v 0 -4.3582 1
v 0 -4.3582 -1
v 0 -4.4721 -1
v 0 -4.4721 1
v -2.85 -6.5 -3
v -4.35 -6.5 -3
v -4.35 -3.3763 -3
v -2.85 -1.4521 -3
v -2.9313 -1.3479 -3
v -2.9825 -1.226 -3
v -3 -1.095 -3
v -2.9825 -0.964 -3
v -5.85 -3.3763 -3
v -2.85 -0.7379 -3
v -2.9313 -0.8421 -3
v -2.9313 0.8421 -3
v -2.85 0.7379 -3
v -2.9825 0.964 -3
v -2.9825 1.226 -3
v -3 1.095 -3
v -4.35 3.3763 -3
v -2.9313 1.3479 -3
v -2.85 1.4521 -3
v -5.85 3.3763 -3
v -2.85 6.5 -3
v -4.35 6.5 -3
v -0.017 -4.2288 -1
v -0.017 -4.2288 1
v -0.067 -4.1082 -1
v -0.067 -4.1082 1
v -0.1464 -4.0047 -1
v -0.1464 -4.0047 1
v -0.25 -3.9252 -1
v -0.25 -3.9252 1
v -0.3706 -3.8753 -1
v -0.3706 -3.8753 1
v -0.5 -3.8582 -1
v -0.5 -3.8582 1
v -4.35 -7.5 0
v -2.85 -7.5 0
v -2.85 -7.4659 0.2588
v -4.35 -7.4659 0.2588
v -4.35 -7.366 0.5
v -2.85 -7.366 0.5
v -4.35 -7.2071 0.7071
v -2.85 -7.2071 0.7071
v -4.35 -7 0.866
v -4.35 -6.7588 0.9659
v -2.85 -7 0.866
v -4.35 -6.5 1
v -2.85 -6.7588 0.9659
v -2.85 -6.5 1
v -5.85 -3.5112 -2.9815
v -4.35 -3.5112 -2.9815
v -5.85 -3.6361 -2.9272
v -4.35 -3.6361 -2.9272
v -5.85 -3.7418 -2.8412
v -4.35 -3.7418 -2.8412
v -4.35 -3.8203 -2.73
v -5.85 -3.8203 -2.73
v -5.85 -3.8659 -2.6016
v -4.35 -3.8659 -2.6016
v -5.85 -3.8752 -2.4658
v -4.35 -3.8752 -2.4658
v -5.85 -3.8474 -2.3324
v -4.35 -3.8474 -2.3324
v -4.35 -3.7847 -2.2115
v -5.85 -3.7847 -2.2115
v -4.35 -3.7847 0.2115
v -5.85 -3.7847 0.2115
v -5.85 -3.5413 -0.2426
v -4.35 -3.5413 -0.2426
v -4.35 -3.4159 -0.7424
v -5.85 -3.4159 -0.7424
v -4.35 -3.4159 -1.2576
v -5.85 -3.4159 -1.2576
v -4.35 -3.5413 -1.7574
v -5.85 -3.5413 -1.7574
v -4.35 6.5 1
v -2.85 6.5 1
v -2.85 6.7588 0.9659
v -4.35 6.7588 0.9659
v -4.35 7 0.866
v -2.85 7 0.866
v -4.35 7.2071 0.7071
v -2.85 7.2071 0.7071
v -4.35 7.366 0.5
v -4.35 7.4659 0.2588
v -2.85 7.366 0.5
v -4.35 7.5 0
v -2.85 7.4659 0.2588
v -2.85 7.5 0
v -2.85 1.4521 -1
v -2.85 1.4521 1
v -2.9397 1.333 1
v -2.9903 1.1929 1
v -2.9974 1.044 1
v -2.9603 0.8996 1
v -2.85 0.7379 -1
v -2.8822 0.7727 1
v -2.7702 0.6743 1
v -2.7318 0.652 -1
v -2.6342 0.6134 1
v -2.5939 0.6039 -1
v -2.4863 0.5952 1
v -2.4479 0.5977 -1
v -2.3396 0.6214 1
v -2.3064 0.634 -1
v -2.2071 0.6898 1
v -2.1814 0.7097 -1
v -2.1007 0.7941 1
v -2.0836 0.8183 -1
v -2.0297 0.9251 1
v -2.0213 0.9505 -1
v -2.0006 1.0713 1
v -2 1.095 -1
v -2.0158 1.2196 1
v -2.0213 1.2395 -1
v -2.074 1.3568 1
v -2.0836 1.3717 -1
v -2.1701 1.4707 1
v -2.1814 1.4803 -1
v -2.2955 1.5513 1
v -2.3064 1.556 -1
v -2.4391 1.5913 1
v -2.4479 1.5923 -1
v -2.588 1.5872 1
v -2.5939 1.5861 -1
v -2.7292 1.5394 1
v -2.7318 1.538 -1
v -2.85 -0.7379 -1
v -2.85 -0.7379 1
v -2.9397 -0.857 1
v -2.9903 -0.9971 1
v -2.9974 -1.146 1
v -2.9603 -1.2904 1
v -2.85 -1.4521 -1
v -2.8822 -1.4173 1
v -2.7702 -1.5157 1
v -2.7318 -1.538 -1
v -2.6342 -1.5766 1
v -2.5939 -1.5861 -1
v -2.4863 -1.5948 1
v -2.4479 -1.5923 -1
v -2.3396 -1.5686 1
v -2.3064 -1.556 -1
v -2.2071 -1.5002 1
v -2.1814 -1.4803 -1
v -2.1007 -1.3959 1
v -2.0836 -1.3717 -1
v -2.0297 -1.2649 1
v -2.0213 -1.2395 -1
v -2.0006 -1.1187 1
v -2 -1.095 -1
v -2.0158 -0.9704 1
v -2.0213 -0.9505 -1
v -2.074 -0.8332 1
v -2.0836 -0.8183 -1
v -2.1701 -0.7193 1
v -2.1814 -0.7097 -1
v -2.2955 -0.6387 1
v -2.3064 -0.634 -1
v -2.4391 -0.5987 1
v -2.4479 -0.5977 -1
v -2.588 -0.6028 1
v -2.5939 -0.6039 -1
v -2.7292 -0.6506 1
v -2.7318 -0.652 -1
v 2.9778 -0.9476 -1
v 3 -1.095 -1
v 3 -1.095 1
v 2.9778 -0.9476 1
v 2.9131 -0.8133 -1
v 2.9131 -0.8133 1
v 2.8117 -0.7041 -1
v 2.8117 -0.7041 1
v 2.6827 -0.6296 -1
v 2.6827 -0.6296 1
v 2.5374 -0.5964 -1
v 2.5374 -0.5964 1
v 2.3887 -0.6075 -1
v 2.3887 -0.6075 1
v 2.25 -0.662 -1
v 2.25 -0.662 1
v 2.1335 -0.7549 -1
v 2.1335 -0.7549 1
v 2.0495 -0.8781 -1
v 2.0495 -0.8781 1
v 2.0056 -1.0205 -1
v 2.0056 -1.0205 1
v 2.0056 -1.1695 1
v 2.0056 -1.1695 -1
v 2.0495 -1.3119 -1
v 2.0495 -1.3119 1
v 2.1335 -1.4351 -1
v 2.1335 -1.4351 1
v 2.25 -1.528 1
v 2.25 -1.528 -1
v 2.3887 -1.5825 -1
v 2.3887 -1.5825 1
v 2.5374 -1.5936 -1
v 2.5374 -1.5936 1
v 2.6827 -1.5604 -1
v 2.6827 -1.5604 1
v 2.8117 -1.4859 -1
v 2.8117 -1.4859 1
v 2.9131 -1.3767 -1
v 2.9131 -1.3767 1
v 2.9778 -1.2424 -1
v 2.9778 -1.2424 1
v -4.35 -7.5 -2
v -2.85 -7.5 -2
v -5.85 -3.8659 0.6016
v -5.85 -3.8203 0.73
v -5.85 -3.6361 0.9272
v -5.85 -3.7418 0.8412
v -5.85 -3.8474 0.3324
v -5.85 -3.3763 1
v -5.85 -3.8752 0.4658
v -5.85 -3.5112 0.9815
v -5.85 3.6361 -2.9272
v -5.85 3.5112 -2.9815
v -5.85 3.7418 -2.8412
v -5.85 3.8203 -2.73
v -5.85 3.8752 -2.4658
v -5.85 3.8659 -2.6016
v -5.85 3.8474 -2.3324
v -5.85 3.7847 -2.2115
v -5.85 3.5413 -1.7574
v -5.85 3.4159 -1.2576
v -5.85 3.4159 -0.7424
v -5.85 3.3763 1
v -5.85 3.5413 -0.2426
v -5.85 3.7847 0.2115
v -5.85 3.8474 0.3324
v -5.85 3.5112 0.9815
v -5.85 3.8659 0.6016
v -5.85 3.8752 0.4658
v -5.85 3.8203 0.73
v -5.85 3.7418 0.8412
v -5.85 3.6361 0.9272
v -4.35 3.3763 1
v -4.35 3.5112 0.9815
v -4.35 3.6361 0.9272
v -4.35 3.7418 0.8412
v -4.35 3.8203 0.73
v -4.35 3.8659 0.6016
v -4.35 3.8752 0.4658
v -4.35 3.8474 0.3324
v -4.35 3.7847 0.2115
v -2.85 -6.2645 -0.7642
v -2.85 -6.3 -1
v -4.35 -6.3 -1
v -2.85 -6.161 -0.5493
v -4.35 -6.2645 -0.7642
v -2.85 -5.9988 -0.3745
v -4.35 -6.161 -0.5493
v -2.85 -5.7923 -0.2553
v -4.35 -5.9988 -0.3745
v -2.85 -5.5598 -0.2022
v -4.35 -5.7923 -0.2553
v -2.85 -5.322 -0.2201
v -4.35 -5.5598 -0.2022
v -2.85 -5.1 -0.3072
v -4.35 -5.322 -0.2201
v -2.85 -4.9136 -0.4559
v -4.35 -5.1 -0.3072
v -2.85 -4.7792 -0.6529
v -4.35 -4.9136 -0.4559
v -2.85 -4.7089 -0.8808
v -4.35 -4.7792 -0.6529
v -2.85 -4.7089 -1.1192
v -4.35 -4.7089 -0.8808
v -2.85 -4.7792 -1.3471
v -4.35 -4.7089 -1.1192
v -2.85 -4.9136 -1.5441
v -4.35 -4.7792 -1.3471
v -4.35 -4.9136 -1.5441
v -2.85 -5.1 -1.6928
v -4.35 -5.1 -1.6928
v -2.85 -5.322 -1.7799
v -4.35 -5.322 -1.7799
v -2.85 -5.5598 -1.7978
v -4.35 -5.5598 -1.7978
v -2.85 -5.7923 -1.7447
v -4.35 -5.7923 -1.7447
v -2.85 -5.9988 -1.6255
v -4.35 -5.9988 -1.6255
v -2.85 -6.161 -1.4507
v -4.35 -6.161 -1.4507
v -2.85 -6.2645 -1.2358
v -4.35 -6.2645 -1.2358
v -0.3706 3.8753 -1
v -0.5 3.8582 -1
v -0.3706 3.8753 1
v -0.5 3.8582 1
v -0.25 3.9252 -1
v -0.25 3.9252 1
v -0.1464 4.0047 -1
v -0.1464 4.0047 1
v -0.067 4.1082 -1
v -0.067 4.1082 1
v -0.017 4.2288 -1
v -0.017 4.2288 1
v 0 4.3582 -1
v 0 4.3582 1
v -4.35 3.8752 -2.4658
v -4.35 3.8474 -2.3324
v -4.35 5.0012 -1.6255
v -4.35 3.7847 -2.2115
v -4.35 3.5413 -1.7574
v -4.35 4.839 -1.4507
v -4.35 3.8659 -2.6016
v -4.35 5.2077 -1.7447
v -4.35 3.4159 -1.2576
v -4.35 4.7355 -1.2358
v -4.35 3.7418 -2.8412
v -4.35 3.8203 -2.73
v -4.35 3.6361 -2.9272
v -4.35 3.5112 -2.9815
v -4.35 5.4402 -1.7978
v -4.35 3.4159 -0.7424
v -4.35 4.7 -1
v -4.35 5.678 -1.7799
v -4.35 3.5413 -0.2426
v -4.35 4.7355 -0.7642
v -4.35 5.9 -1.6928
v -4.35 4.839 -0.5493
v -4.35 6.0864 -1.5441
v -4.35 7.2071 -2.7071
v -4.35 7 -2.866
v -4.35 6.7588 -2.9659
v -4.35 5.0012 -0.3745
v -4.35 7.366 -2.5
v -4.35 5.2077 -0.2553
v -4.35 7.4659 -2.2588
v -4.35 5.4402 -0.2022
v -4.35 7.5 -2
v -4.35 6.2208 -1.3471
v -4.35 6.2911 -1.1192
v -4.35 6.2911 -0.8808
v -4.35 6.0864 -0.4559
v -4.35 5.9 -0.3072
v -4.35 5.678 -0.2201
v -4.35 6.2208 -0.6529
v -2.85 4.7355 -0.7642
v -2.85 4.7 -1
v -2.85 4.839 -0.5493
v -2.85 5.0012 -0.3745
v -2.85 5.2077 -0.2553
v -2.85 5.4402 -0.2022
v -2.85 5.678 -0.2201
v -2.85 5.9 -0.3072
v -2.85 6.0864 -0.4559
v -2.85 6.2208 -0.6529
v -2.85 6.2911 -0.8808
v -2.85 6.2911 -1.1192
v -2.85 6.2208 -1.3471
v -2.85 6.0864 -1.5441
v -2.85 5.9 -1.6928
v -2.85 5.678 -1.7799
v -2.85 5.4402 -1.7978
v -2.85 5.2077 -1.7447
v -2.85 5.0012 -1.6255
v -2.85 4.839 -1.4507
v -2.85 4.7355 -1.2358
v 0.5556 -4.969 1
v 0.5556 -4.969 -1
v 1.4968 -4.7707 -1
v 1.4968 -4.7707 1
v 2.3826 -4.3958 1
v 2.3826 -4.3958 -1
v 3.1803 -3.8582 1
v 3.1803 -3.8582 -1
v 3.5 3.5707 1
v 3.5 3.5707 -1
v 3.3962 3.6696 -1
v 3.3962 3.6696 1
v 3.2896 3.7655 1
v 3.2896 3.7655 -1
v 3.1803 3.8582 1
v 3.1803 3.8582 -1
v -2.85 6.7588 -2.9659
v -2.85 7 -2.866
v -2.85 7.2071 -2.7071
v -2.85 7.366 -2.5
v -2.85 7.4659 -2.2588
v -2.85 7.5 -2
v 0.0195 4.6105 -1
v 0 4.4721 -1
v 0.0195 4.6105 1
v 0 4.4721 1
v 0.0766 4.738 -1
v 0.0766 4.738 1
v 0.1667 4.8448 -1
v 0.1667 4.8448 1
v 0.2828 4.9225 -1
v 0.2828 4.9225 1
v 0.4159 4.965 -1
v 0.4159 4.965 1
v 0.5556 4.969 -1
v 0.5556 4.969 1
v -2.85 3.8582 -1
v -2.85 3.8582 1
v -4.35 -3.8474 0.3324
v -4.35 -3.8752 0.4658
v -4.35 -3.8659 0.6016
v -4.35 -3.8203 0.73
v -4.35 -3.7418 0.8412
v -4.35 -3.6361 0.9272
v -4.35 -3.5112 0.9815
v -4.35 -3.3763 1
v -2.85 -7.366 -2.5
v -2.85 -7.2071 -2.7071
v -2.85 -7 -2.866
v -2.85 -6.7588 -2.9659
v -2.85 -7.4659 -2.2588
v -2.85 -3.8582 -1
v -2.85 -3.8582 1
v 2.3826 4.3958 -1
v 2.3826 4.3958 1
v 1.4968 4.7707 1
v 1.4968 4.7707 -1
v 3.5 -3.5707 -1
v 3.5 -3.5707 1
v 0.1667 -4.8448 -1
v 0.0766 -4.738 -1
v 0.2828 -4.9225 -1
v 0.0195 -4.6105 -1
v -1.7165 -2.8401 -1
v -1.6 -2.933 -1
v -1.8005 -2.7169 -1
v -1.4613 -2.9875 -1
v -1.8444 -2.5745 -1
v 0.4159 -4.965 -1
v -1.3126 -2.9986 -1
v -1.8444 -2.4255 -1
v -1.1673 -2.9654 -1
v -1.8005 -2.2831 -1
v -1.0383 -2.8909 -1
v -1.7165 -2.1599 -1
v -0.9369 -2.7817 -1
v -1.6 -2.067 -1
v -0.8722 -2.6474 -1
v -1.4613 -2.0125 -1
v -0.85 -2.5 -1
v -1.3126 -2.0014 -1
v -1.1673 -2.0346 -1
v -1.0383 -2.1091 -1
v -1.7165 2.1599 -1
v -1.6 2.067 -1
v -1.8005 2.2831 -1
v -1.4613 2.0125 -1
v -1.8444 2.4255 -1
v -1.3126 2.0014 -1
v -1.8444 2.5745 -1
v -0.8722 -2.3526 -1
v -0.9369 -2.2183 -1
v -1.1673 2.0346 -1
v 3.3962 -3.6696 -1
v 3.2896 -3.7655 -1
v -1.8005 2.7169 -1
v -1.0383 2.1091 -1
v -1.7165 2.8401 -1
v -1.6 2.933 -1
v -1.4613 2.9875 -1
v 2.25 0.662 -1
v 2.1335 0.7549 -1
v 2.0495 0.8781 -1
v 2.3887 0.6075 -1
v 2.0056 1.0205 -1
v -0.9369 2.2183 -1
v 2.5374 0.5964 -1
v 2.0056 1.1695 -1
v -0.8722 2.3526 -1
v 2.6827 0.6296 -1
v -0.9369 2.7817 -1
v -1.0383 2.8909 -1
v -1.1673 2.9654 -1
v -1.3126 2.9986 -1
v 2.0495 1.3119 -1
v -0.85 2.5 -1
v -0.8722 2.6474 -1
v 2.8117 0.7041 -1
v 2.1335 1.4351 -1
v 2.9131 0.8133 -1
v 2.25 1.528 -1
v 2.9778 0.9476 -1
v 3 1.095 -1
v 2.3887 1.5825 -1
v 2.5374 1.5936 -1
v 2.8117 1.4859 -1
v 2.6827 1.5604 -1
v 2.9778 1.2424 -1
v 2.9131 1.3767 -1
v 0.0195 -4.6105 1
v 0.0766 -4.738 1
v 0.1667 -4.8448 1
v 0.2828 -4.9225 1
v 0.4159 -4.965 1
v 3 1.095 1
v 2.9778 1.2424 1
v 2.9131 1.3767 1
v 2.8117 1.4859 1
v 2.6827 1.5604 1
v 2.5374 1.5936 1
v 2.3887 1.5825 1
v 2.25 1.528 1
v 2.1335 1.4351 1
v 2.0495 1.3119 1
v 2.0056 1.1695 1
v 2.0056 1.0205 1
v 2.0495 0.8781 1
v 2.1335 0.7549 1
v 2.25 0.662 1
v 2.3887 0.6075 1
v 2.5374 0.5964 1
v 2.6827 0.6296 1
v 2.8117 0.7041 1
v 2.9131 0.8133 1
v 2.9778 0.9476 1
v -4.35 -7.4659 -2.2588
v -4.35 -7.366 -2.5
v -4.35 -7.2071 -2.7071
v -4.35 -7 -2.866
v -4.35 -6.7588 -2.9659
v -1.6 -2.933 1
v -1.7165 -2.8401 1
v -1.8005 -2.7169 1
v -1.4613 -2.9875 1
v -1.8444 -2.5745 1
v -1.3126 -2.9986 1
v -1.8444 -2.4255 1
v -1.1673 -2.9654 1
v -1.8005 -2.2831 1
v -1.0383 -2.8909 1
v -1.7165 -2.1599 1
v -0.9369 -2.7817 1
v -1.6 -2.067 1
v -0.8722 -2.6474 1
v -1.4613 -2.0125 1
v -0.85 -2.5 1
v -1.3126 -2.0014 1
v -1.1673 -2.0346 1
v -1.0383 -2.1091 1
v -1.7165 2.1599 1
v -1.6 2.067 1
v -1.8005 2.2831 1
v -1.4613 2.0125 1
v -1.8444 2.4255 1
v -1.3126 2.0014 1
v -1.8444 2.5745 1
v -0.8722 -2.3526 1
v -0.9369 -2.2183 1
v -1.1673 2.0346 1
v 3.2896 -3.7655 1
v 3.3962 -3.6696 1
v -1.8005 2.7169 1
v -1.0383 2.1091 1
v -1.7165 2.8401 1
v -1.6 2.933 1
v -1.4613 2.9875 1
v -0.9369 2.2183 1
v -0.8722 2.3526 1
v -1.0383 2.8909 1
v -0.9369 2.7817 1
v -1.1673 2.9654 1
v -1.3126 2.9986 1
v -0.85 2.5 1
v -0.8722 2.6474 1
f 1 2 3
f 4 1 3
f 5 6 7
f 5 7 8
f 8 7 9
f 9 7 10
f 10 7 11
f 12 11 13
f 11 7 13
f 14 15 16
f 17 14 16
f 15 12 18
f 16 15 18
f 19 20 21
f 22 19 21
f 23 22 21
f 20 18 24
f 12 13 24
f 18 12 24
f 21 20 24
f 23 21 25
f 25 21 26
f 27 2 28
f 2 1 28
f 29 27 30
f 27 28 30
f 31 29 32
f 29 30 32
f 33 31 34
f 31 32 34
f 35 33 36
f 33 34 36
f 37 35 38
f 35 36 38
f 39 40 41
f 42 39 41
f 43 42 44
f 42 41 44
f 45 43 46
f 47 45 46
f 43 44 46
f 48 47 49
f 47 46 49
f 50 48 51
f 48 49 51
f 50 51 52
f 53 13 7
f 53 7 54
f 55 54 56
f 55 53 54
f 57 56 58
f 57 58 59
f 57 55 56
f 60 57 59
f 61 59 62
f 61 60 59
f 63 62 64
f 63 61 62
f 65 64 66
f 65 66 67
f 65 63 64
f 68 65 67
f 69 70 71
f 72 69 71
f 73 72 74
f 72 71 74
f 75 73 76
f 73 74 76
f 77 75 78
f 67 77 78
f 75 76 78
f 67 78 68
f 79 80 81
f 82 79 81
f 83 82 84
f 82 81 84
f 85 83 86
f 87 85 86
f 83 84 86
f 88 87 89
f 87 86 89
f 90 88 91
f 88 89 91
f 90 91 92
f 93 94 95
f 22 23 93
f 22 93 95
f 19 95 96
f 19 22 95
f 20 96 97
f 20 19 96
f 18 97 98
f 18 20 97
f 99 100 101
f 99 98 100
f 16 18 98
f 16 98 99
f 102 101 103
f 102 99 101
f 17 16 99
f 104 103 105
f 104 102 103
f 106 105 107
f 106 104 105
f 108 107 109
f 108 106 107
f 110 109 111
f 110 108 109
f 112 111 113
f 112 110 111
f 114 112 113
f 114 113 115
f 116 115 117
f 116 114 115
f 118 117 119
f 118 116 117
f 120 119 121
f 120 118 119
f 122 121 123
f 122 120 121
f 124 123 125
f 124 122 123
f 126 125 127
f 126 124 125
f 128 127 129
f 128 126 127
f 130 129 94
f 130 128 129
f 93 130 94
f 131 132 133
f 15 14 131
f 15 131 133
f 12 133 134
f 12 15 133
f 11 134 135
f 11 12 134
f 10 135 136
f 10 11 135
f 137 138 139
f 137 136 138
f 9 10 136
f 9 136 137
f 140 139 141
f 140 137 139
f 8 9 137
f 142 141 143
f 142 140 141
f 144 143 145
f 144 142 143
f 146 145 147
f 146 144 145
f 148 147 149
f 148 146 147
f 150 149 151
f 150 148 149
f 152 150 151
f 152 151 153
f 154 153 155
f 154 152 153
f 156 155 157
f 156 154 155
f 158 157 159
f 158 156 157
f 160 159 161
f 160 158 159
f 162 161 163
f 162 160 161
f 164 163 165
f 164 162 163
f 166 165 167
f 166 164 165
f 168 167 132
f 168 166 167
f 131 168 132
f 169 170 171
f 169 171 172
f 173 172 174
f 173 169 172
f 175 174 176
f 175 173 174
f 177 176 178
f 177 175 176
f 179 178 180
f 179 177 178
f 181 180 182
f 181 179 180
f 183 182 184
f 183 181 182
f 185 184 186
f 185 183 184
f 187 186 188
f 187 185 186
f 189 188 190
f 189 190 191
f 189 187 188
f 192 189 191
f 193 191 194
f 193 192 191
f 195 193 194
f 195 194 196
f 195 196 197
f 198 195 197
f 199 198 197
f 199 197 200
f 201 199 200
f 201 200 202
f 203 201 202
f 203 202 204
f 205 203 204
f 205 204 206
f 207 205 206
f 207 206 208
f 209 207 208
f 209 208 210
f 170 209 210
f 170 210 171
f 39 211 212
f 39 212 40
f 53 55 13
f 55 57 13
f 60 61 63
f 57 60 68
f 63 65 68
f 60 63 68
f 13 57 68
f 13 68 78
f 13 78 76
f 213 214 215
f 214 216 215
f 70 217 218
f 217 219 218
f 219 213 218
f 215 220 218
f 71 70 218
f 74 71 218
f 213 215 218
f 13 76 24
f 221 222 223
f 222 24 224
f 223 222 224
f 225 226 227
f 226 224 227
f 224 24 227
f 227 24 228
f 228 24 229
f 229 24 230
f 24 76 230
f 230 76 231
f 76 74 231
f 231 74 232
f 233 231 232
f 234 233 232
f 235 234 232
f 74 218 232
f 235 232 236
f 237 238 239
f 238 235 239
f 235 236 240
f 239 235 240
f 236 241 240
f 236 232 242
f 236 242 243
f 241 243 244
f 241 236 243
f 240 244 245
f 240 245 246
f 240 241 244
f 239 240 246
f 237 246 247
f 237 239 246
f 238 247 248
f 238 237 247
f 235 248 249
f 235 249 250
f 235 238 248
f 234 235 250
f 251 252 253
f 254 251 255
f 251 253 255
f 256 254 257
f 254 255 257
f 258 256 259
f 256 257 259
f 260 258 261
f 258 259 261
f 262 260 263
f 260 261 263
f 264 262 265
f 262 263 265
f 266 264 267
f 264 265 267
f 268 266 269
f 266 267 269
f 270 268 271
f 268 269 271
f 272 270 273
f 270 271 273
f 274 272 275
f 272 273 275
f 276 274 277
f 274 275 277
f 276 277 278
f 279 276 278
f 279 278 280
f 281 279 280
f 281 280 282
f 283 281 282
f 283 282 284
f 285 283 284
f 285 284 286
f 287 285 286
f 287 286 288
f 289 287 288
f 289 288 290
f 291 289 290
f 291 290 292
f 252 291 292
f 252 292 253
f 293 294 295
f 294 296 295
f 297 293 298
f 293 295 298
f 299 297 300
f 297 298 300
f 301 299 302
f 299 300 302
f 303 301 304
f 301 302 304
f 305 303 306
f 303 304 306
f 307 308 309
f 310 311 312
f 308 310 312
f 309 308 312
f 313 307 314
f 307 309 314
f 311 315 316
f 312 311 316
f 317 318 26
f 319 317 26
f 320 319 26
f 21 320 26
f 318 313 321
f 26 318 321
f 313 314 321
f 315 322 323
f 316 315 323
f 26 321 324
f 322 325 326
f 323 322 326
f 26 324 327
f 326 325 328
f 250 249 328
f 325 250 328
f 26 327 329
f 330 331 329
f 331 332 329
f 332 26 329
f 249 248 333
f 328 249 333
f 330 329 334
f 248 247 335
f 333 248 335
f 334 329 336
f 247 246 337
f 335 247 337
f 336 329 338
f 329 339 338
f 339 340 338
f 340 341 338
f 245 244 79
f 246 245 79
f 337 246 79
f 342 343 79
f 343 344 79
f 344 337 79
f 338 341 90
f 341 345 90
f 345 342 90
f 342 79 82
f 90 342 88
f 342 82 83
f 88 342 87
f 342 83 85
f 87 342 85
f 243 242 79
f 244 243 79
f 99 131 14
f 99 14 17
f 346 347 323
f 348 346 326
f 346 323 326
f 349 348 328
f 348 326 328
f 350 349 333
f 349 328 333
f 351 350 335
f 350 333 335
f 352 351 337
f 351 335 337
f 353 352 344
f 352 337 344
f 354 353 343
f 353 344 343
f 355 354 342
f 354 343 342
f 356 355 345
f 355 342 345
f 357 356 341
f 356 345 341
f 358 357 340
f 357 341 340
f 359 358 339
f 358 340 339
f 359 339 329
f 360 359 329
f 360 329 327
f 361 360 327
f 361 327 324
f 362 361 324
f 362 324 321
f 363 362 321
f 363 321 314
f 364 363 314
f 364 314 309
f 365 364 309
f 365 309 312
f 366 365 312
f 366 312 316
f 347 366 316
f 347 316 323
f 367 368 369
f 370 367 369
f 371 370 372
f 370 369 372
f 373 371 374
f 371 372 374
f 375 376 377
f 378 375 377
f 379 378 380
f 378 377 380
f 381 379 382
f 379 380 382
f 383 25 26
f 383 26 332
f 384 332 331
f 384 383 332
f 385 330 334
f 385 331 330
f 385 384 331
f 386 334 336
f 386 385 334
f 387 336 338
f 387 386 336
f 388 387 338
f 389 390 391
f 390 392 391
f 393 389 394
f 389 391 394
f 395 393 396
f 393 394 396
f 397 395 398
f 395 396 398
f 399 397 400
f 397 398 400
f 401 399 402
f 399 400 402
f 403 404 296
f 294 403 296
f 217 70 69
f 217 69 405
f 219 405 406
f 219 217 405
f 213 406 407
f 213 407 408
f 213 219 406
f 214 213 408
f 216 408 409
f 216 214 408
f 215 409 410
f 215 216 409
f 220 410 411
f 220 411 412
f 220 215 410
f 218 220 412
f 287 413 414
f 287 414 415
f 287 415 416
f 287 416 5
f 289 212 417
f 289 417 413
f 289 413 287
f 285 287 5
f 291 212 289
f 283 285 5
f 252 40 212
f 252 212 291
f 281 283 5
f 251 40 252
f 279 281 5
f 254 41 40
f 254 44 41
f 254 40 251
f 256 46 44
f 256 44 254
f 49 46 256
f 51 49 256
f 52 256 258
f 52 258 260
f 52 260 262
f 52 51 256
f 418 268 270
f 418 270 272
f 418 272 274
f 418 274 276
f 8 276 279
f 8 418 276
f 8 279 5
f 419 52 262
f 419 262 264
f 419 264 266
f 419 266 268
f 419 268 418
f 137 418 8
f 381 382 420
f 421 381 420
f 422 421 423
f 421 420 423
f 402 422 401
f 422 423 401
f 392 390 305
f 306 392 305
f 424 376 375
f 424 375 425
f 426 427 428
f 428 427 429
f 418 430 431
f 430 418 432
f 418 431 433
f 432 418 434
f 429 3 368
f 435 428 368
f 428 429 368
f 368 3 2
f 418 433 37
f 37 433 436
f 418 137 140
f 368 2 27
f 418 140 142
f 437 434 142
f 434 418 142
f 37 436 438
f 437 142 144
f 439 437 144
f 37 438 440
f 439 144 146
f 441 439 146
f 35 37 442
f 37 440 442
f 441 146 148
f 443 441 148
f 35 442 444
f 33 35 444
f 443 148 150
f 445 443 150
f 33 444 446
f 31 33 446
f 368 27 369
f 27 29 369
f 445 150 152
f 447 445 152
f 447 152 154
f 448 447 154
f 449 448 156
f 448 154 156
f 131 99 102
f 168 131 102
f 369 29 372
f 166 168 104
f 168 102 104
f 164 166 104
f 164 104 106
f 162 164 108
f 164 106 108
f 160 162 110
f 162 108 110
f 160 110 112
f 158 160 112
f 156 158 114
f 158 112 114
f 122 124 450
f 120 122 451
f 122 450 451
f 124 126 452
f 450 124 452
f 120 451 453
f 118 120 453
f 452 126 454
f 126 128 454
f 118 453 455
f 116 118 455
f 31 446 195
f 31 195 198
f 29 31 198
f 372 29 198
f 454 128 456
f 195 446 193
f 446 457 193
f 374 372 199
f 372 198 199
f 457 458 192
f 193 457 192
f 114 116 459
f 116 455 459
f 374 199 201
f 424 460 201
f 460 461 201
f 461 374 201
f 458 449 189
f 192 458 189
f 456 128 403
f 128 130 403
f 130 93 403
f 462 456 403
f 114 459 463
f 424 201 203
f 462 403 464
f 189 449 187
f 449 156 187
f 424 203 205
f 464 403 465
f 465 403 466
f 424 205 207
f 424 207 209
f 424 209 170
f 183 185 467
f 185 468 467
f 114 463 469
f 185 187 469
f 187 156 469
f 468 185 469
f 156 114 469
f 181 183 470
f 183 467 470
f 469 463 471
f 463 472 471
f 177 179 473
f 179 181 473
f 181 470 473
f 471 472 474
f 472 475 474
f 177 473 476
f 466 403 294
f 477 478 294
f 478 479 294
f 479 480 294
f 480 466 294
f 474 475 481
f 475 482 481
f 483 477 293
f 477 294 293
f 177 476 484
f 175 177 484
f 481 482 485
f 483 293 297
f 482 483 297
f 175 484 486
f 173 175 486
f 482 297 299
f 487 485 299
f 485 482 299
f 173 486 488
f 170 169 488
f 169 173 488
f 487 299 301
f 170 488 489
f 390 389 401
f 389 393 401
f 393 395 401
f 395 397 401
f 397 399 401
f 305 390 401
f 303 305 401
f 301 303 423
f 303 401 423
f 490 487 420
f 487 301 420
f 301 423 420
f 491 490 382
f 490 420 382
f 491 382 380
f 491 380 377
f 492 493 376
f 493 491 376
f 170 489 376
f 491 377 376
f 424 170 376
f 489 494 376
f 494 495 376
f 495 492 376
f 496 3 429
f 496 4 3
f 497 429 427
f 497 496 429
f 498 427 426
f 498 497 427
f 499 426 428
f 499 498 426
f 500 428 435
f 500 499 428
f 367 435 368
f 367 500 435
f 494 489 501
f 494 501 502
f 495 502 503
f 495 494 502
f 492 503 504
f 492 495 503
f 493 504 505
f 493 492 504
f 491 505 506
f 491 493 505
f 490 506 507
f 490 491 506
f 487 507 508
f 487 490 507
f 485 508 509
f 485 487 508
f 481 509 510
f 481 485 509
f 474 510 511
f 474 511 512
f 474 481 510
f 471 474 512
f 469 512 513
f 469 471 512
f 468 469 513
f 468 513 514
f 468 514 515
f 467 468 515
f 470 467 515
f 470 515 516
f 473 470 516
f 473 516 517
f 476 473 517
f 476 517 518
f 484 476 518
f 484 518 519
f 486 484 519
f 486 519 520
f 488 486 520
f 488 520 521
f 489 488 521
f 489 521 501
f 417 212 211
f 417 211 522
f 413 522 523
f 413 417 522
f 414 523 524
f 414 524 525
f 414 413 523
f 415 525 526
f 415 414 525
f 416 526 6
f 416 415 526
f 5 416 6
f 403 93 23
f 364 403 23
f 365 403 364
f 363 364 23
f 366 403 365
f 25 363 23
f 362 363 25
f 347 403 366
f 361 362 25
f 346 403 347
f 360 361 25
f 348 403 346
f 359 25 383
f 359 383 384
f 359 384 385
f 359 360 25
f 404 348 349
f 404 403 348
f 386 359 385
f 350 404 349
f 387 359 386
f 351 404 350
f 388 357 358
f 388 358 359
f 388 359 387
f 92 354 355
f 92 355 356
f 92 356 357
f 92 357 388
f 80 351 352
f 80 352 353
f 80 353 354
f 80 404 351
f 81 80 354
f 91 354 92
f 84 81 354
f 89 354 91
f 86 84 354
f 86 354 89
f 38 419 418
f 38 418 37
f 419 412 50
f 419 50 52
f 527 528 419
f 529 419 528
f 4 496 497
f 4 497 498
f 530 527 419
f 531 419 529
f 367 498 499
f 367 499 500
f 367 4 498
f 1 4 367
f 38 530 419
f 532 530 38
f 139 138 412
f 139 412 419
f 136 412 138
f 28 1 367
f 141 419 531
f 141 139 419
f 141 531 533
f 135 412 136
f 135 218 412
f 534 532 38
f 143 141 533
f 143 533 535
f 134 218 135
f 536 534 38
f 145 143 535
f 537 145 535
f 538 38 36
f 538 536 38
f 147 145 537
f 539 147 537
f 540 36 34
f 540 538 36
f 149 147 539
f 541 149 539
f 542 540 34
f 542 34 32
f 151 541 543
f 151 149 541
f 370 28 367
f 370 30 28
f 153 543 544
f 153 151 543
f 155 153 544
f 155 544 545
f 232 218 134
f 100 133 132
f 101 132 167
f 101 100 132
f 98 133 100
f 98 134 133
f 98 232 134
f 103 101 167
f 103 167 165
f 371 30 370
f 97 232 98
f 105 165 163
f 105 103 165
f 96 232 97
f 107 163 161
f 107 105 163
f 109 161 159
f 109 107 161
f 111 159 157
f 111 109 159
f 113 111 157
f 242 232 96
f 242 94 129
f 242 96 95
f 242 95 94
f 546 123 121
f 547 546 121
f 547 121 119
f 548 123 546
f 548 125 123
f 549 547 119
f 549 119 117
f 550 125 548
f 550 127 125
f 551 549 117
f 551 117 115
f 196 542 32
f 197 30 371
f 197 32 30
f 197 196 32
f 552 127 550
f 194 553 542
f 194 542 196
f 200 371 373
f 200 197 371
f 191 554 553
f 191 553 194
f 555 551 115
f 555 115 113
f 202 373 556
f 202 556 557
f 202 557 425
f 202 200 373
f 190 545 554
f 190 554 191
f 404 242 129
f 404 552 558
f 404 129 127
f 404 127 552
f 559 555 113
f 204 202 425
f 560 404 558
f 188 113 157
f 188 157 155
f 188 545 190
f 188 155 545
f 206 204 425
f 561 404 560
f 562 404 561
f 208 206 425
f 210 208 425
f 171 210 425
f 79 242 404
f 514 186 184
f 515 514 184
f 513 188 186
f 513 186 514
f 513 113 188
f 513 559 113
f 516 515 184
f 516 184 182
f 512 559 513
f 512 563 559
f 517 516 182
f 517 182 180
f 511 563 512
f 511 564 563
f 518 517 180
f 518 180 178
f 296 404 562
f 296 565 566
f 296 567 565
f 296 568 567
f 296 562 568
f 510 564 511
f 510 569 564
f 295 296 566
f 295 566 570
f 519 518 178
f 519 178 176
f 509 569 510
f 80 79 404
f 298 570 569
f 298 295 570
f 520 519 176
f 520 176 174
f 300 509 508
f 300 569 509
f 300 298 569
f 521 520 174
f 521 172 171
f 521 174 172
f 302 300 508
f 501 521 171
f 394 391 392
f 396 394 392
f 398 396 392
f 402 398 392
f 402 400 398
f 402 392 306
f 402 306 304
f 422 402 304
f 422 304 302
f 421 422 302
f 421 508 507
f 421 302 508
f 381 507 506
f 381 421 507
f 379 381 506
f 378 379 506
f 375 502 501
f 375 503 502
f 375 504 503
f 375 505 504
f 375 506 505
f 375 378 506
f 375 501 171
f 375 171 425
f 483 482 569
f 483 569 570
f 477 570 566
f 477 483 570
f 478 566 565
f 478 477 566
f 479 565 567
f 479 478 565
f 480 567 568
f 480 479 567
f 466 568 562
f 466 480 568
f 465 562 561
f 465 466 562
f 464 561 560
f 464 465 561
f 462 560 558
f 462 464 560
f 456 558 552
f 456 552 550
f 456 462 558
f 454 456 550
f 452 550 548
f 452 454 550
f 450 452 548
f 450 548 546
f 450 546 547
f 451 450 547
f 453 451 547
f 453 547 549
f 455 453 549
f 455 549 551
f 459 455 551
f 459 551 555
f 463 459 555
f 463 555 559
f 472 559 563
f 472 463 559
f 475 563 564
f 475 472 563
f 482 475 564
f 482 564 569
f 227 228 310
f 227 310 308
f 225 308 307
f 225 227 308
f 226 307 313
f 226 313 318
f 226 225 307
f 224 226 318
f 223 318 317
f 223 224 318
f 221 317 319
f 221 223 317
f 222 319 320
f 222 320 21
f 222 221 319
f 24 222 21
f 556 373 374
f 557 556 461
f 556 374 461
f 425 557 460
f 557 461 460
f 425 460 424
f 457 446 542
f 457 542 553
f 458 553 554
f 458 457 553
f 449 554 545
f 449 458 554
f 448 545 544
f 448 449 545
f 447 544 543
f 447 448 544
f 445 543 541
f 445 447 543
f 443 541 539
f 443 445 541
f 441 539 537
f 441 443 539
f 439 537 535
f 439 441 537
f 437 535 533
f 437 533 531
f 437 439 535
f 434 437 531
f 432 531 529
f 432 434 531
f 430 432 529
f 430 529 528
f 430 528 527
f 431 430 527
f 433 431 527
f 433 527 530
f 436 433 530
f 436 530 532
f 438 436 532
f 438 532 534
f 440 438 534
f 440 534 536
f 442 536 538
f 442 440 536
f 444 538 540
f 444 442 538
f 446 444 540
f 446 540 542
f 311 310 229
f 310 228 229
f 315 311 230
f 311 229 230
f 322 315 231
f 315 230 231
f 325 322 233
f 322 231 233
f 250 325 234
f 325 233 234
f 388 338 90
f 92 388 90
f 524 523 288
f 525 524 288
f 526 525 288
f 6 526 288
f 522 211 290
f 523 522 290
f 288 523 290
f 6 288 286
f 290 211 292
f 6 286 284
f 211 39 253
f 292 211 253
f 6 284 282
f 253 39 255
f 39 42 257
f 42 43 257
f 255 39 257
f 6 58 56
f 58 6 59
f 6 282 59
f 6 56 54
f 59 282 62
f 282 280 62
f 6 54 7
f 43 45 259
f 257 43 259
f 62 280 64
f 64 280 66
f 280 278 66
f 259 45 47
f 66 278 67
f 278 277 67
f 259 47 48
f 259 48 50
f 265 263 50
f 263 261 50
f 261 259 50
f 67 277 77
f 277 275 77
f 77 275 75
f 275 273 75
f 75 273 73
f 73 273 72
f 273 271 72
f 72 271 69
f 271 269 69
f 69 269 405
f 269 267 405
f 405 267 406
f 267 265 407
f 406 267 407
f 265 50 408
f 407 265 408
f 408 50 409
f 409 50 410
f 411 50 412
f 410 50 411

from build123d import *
from build123d.topology import SkipClean

# Parameters (mm, degrees)
BOSS_EXTRUDE1_DEPTH       = 1
BOSS_EXTRUDE1_DEPTH_BACK  = 1
SKETCH1_R                 = 5
SKETCH1_R_2               = 0.5
BOSS_EXTRUDE2_START       = -5.85
BOSS_EXTRUDE2_OUTLINE_W   = 15
BOSS_EXTRUDE2_OUTLINE_H   = 4
BOSS_EXTRUDE2_DEPTH       = 3
BOSS_EXTRUDE2_START_2     = -4
BOSS_EXTRUDE2_2_OUTLINE_R = 0.5
BOSS_EXTRUDE2_2_DEPTH     = 6
CUT_EXTRUDE4_DEPTH        = 8
SKETCH6_R                 = 0.8
CUT_EXTRUDE3_DEPTH        = 9
SKETCH9_W                 = 8
SKETCH9_H                 = 0.25
CUT_EXTRUDE5_DEPTH        = 2
SKETCH10_R                = 2.1
SKETCH10_R_2              = 0.8
CUT_EXTRUDE6_DEPTH        = 1.5
FILLET2_R                 = 1
FILLET3_START             = -5.85
FILLET3_DEPTH             = 1.5
CUT_EXTRUDE2_START        = -10
CUT_EXTRUDE2_DEPTH        = 10
BOSS_EXTRUDE3_START       = -2
BOSS_EXTRUDE3_DEPTH       = 2
FILLET4_R                 = 0.5
CUT_EXTRUDE7_DEPTH        = 1.5


with BuildPart() as part:
    # Sketch1 → Boss-Extrude1 (new, two sides: drawn at the far end of the back side and taken through both)
    with BuildSketch(Plane.XY.offset(-BOSS_EXTRUDE1_DEPTH_BACK)):
        Circle(SKETCH1_R)
        with Locations((-2.5, 1.095)):
            Circle(SKETCH1_R_2, mode=Mode.SUBTRACT)
        with Locations((2.5, 1.095)):
            Circle(SKETCH1_R_2, mode=Mode.SUBTRACT)
        with Locations((-2.5, -1.095)):
            Circle(SKETCH1_R_2, mode=Mode.SUBTRACT)
        with Locations((2.5, -1.095)):
            Circle(SKETCH1_R_2, mode=Mode.SUBTRACT)
        with Locations((-1.35, 2.5)):
            Circle(SKETCH1_R_2, mode=Mode.SUBTRACT)
        with Locations((-1.35, -2.5)):
            Circle(SKETCH1_R_2, mode=Mode.SUBTRACT)
    extrude(amount=BOSS_EXTRUDE1_DEPTH + BOSS_EXTRUDE1_DEPTH_BACK)

    # Boss-Extrude2: read off the stored shape, not the designer's step
    # Boss-Extrude2 outline → Boss-Extrude2 (add)
    with BuildSketch(Plane.YZ.offset(BOSS_EXTRUDE2_START)):
        with Locations((0, -1)):
            Rectangle(BOSS_EXTRUDE2_OUTLINE_W, BOSS_EXTRUDE2_OUTLINE_H)
    extrude(amount=BOSS_EXTRUDE2_DEPTH)

    # Boss-Extrude2 2 outline → Boss-Extrude2 2 (cut)
    with SkipClean():  # the faces are left unmerged after this step: merging them gives an invalid solid
        with BuildSketch(Plane.XY.offset(BOSS_EXTRUDE2_START_2)):
            with Locations((-2.5, 1.095)):
                Circle(BOSS_EXTRUDE2_2_OUTLINE_R)
            with Locations((-2.5, -1.095)):
                Circle(BOSS_EXTRUDE2_2_OUTLINE_R)
        extrude(amount=BOSS_EXTRUDE2_2_DEPTH, mode=Mode.SUBTRACT)

    # Sketch7 → Cut-Extrude4 (cut)
    with SkipClean():  # the faces are left unmerged after this step: merging them gives an invalid solid
        with BuildSketch(Plane(origin=(-2.85, 0, 0), x_dir=(0, 0, -1), z_dir=(1, 0, 0))):
            Polygon((-1, 7.5), (-1, 4.10822346), (1, 4.10822346), (1, 1.452071421), (3, 1.452071421), (3, 7.5), align=None)
            Polygon((-1, -4.10822346), (-1, -7.5), (3, -7.5), (3, -1.452071421), (1, -1.452071421), (1, -4.10822346), align=None)
        extrude(amount=CUT_EXTRUDE4_DEPTH, mode=Mode.SUBTRACT)

    # Sketch6 → Cut-Extrude3 (cut)
    with SkipClean():  # the faces are left unmerged after this step: merging them gives an invalid solid
        with BuildSketch(Plane.ZY.offset(5.85)):
            with Locations(Location((-1, 5.5, 0), (0, 0, 270))):
                Circle(SKETCH6_R)
            with Locations(Location((-1, -5.5, 0), (0, 0, 270))):
                Circle(SKETCH6_R)
        extrude(amount=-CUT_EXTRUDE3_DEPTH, mode=Mode.SUBTRACT)

    # Sketch9 → Cut-Extrude5 (cut)
    with SkipClean():  # the faces are left unmerged after this step: merging them gives an invalid solid
        with BuildSketch(Plane.XY.offset(1)):
            with Locations((1.15, 3.98322346)):
                Rectangle(SKETCH9_W, SKETCH9_H)
            with Locations((1.15, -3.98322346)):
                Rectangle(SKETCH9_W, SKETCH9_H)
        extrude(amount=-CUT_EXTRUDE5_DEPTH, mode=Mode.SUBTRACT)

    # Sketch10 → Cut-Extrude6 (cut)
    # profile 1 of 2: a face of its own
    with SkipClean():  # the faces are left unmerged after this step: merging them gives an invalid solid
        with BuildSketch(Plane.ZY.offset(5.85)):
            with Locations((-1, 5.5)):
                Circle(SKETCH10_R)
            with Locations((-1, 5.5)):
                Circle(SKETCH10_R_2, mode=Mode.SUBTRACT)
        # profile 2 of 2: a face of its own
        with BuildSketch(Plane.ZY.offset(5.85)):
            with Locations((-1, -5.5)):
                Circle(SKETCH10_R)
            with Locations((-1, -5.5)):
                Circle(SKETCH10_R_2, mode=Mode.SUBTRACT)
        extrude(amount=-CUT_EXTRUDE6_DEPTH, mode=Mode.SUBTRACT)

    # Fillet2
    fillet2_edges = [part.edges().sort_by_distance(p)[0] for p in [
        (-4.35, 7.5, -3),
        (-4.35, -7.5, 1),
        (-4.35, -7.5, -3),
        (-4.35, 7.5, 1),
    ]]
    fillet(fillet2_edges, radius=FILLET2_R)

    # Fillet3: read off the stored shape, not the designer's step
    # Fillet3 outline → Fillet3 (cut)
    with SkipClean():  # the faces are left unmerged after this step: merging them gives an invalid solid
        with BuildSketch(Plane.YZ.offset(FILLET3_START)):
            with BuildLine():
                ThreePointArc((-6.696065005, -2.726102113), (-6.574273302, -2.846043449), (-6.5, -3))
                Line((-6.5, -3), (-6.140312424, -3))
                ThreePointArc((-6.140312424, -3), (-6.428345587, -2.883659861), (-6.696065005, -2.726102113))
            make_face()
            with BuildLine():
                ThreePointArc((-7.5, -2), (-7.346043449, -2.074273302), (-7.226102113, -2.196065005))
                ThreePointArc((-7.226102113, -2.196065005), (-7.383659861, -1.928345587), (-7.5, -1.640312424))
                Line((-7.5, -1.640312424), (-7.5, -2))
            make_face()
            with BuildLine():
                ThreePointArc((-3.784723184, -2.211538462), (-4.257978234, -2.693334561), (-4.859687576, -3))
                Line((-4.859687576, -3), (-3.376323942, -3))
                ThreePointArc((-3.376323942, -3), (-3.820300726, -2.729966553), (-3.784723184, -2.211538462))
            make_face()
            with BuildLine():
                Line((-7.5, 0), (-7.5, -0.359687576))
                ThreePointArc((-7.5, -0.359687576), (-7.383659861, -0.071654413), (-7.226102112, 0.196065005))
                ThreePointArc((-7.226102112, 0.196065005), (-7.346043449, 0.074273302), (-7.5, 0))
            make_face()
            with BuildLine():
                ThreePointArc((-4.859687576, 1), (-4.257978234, 0.693334561), (-3.784723184, 0.211538462))
                ThreePointArc((-3.784723184, 0.211538462), (-3.820300726, 0.729966553), (-3.376323942, 1))
                Line((-3.376323942, 1), (-4.859687576, 1))
            make_face()
            with BuildLine():
                ThreePointArc((3.784723184, -2.211538462), (3.820300726, -2.729966553), (3.376323942, -3))
                Line((3.376323942, -3), (4.859687576, -3))
                ThreePointArc((4.859687576, -3), (4.257978234, -2.693334561), (3.784723184, -2.211538462))
            make_face()
            with BuildLine():
                ThreePointArc((-6.5, 1), (-6.574273302, 0.846043449), (-6.696065005, 0.726102113))
                ThreePointArc((-6.696065005, 0.726102113), (-6.428345587, 0.883659861), (-6.140312424, 1))
                Line((-6.140312424, 1), (-6.5, 1))
            make_face()
            with BuildLine():
                Line((4.859687576, 1), (3.376323942, 1))
                ThreePointArc((3.376323942, 1), (3.820300726, 0.729966553), (3.784723184, 0.211538462))
                ThreePointArc((3.784723184, 0.211538462), (4.257978234, 0.693334561), (4.859687576, 1))
            make_face()
            with BuildLine():
                ThreePointArc((6.696065005, -2.726102112), (6.428345587, -2.883659861), (6.140312424, -3))
                Line((6.140312424, -3), (6.5, -3))
                ThreePointArc((6.5, -3), (6.574273302, -2.846043449), (6.696065005, -2.726102112))
            make_face()
            with BuildLine():
                Line((6.5, 1), (6.140312424, 1))
                ThreePointArc((6.140312424, 1), (6.428345587, 0.883659861), (6.696065005, 0.726102112))
                ThreePointArc((6.696065005, 0.726102112), (6.574273302, 0.846043449), (6.5, 1))
            make_face()
            with BuildLine():
                ThreePointArc((7.5, -1.640312424), (7.383659861, -1.928345587), (7.226102112, -2.196065005))
                ThreePointArc((7.226102112, -2.196065005), (7.346043449, -2.074273302), (7.5, -2))
                Line((7.5, -2), (7.5, -1.640312424))
            make_face()
            with BuildLine():
                ThreePointArc((7.5, 0), (7.346043449, 0.074273302), (7.226102113, 0.196065005))
                ThreePointArc((7.226102113, 0.196065005), (7.383659861, -0.071654413), (7.5, -0.359687576))
                Line((7.5, -0.359687576), (7.5, 0))
            make_face()
        extrude(amount=FILLET3_DEPTH, mode=Mode.SUBTRACT)

    # Sketch3 → Cut-Extrude2 (cut)
    with SkipClean():  # the faces are left unmerged after this step: merging them gives an invalid solid
        with BuildSketch(Plane.XY.offset(1).offset(CUT_EXTRUDE2_START)):
            with BuildLine():
                ThreePointArc((3.5, -3.570714214), (5, 0), (3.5, 3.570714214))
                Line((3.5, 3.570714214), (3.5, -3.570714214))
            make_face()
        extrude(amount=CUT_EXTRUDE2_DEPTH, mode=Mode.SUBTRACT)

    # Sketch11 → Boss-Extrude3 (add)
    with SkipClean():  # the faces are left unmerged after this step: merging them gives an invalid solid
        with BuildSketch(Plane.XY.offset(1).offset(BOSS_EXTRUDE3_START)):
            with BuildLine():
                Line((0, -3.85822346), (0, -5))
                ThreePointArc((0, -5), (1.689509204, -4.705906783), (3.180269129, -3.85822346))
                Line((3.180269129, -3.85822346), (0, -3.85822346))
            make_face()
            with BuildLine():
                Line((0, 5), (0, 3.85822346))
                Line((0, 3.85822346), (3.180269129, 3.85822346))
                ThreePointArc((3.180269129, 3.85822346), (1.689509204, 4.705906783), (0, 5))
            make_face()
        extrude(amount=BOSS_EXTRUDE3_DEPTH)

    # Fillet4
    fillet4_edges = [part.edges().sort_by_distance(p)[0] for p in [
        (0, -5, 0),
        (0, -3.85822346, 0),
        (0, 3.85822346, 0),
        (0, 5, 0),
    ]]
    fillet(fillet4_edges, radius=FILLET4_R)

    # Sketch12 → Cut-Extrude7 (cut)
    with BuildSketch(Plane.ZY.offset(5.85)):
        with BuildLine():
            ThreePointArc((1, 6.5), (0.707106781, 7.207106781), (0, 7.5))
            ThreePointArc((0, 7.5), (0.074273302, 7.346043449), (0.196065005, 7.226102113))
            ThreePointArc((0.196065005, 7.226102113), (0.48492424, 6.98492424), (0.726102113, 6.696065005))
            ThreePointArc((0.726102113, 6.696065005), (0.846043449, 6.574273302), (1, 6.5))
        make_face()
        with BuildLine():
            ThreePointArc((-2.726102113, -6.696065005), (-2.48492424, -6.98492424), (-2.196065005, -7.226102113))
            ThreePointArc((-2.196065005, -7.226102113), (-2.074273302, -7.346043449), (-2, -7.5))
            ThreePointArc((-2, -7.5), (-2.707106781, -7.207106781), (-3, -6.5))
            ThreePointArc((-3, -6.5), (-2.846043449, -6.574273302), (-2.726102113, -6.696065005))
        make_face()
        with BuildLine():
            ThreePointArc((0, -7.5), (0.707106781, -7.207106781), (1, -6.5))
            ThreePointArc((1, -6.5), (0.846043449, -6.574273302), (0.726102113, -6.696065005))
            ThreePointArc((0.726102113, -6.696065005), (0.48492424, -6.98492424), (0.196065005, -7.226102113))
            ThreePointArc((0.196065005, -7.226102113), (0.074273302, -7.346043449), (0, -7.5))
        make_face()
        with BuildLine():
            ThreePointArc((-2, 7.5), (-2.707106781, 7.207106781), (-3, 6.5))
            ThreePointArc((-3, 6.5), (-2.846043449, 6.574273302), (-2.726102113, 6.696065005))
            ThreePointArc((-2.726102113, 6.696065005), (-2.48492424, 6.98492424), (-2.196065005, 7.226102113))
            ThreePointArc((-2.196065005, 7.226102113), (-2.074273302, 7.346043449), (-2, 7.5))
        make_face()
    extrude(amount=-CUT_EXTRUDE7_DEPTH, mode=Mode.SUBTRACT)


solid = part.part
